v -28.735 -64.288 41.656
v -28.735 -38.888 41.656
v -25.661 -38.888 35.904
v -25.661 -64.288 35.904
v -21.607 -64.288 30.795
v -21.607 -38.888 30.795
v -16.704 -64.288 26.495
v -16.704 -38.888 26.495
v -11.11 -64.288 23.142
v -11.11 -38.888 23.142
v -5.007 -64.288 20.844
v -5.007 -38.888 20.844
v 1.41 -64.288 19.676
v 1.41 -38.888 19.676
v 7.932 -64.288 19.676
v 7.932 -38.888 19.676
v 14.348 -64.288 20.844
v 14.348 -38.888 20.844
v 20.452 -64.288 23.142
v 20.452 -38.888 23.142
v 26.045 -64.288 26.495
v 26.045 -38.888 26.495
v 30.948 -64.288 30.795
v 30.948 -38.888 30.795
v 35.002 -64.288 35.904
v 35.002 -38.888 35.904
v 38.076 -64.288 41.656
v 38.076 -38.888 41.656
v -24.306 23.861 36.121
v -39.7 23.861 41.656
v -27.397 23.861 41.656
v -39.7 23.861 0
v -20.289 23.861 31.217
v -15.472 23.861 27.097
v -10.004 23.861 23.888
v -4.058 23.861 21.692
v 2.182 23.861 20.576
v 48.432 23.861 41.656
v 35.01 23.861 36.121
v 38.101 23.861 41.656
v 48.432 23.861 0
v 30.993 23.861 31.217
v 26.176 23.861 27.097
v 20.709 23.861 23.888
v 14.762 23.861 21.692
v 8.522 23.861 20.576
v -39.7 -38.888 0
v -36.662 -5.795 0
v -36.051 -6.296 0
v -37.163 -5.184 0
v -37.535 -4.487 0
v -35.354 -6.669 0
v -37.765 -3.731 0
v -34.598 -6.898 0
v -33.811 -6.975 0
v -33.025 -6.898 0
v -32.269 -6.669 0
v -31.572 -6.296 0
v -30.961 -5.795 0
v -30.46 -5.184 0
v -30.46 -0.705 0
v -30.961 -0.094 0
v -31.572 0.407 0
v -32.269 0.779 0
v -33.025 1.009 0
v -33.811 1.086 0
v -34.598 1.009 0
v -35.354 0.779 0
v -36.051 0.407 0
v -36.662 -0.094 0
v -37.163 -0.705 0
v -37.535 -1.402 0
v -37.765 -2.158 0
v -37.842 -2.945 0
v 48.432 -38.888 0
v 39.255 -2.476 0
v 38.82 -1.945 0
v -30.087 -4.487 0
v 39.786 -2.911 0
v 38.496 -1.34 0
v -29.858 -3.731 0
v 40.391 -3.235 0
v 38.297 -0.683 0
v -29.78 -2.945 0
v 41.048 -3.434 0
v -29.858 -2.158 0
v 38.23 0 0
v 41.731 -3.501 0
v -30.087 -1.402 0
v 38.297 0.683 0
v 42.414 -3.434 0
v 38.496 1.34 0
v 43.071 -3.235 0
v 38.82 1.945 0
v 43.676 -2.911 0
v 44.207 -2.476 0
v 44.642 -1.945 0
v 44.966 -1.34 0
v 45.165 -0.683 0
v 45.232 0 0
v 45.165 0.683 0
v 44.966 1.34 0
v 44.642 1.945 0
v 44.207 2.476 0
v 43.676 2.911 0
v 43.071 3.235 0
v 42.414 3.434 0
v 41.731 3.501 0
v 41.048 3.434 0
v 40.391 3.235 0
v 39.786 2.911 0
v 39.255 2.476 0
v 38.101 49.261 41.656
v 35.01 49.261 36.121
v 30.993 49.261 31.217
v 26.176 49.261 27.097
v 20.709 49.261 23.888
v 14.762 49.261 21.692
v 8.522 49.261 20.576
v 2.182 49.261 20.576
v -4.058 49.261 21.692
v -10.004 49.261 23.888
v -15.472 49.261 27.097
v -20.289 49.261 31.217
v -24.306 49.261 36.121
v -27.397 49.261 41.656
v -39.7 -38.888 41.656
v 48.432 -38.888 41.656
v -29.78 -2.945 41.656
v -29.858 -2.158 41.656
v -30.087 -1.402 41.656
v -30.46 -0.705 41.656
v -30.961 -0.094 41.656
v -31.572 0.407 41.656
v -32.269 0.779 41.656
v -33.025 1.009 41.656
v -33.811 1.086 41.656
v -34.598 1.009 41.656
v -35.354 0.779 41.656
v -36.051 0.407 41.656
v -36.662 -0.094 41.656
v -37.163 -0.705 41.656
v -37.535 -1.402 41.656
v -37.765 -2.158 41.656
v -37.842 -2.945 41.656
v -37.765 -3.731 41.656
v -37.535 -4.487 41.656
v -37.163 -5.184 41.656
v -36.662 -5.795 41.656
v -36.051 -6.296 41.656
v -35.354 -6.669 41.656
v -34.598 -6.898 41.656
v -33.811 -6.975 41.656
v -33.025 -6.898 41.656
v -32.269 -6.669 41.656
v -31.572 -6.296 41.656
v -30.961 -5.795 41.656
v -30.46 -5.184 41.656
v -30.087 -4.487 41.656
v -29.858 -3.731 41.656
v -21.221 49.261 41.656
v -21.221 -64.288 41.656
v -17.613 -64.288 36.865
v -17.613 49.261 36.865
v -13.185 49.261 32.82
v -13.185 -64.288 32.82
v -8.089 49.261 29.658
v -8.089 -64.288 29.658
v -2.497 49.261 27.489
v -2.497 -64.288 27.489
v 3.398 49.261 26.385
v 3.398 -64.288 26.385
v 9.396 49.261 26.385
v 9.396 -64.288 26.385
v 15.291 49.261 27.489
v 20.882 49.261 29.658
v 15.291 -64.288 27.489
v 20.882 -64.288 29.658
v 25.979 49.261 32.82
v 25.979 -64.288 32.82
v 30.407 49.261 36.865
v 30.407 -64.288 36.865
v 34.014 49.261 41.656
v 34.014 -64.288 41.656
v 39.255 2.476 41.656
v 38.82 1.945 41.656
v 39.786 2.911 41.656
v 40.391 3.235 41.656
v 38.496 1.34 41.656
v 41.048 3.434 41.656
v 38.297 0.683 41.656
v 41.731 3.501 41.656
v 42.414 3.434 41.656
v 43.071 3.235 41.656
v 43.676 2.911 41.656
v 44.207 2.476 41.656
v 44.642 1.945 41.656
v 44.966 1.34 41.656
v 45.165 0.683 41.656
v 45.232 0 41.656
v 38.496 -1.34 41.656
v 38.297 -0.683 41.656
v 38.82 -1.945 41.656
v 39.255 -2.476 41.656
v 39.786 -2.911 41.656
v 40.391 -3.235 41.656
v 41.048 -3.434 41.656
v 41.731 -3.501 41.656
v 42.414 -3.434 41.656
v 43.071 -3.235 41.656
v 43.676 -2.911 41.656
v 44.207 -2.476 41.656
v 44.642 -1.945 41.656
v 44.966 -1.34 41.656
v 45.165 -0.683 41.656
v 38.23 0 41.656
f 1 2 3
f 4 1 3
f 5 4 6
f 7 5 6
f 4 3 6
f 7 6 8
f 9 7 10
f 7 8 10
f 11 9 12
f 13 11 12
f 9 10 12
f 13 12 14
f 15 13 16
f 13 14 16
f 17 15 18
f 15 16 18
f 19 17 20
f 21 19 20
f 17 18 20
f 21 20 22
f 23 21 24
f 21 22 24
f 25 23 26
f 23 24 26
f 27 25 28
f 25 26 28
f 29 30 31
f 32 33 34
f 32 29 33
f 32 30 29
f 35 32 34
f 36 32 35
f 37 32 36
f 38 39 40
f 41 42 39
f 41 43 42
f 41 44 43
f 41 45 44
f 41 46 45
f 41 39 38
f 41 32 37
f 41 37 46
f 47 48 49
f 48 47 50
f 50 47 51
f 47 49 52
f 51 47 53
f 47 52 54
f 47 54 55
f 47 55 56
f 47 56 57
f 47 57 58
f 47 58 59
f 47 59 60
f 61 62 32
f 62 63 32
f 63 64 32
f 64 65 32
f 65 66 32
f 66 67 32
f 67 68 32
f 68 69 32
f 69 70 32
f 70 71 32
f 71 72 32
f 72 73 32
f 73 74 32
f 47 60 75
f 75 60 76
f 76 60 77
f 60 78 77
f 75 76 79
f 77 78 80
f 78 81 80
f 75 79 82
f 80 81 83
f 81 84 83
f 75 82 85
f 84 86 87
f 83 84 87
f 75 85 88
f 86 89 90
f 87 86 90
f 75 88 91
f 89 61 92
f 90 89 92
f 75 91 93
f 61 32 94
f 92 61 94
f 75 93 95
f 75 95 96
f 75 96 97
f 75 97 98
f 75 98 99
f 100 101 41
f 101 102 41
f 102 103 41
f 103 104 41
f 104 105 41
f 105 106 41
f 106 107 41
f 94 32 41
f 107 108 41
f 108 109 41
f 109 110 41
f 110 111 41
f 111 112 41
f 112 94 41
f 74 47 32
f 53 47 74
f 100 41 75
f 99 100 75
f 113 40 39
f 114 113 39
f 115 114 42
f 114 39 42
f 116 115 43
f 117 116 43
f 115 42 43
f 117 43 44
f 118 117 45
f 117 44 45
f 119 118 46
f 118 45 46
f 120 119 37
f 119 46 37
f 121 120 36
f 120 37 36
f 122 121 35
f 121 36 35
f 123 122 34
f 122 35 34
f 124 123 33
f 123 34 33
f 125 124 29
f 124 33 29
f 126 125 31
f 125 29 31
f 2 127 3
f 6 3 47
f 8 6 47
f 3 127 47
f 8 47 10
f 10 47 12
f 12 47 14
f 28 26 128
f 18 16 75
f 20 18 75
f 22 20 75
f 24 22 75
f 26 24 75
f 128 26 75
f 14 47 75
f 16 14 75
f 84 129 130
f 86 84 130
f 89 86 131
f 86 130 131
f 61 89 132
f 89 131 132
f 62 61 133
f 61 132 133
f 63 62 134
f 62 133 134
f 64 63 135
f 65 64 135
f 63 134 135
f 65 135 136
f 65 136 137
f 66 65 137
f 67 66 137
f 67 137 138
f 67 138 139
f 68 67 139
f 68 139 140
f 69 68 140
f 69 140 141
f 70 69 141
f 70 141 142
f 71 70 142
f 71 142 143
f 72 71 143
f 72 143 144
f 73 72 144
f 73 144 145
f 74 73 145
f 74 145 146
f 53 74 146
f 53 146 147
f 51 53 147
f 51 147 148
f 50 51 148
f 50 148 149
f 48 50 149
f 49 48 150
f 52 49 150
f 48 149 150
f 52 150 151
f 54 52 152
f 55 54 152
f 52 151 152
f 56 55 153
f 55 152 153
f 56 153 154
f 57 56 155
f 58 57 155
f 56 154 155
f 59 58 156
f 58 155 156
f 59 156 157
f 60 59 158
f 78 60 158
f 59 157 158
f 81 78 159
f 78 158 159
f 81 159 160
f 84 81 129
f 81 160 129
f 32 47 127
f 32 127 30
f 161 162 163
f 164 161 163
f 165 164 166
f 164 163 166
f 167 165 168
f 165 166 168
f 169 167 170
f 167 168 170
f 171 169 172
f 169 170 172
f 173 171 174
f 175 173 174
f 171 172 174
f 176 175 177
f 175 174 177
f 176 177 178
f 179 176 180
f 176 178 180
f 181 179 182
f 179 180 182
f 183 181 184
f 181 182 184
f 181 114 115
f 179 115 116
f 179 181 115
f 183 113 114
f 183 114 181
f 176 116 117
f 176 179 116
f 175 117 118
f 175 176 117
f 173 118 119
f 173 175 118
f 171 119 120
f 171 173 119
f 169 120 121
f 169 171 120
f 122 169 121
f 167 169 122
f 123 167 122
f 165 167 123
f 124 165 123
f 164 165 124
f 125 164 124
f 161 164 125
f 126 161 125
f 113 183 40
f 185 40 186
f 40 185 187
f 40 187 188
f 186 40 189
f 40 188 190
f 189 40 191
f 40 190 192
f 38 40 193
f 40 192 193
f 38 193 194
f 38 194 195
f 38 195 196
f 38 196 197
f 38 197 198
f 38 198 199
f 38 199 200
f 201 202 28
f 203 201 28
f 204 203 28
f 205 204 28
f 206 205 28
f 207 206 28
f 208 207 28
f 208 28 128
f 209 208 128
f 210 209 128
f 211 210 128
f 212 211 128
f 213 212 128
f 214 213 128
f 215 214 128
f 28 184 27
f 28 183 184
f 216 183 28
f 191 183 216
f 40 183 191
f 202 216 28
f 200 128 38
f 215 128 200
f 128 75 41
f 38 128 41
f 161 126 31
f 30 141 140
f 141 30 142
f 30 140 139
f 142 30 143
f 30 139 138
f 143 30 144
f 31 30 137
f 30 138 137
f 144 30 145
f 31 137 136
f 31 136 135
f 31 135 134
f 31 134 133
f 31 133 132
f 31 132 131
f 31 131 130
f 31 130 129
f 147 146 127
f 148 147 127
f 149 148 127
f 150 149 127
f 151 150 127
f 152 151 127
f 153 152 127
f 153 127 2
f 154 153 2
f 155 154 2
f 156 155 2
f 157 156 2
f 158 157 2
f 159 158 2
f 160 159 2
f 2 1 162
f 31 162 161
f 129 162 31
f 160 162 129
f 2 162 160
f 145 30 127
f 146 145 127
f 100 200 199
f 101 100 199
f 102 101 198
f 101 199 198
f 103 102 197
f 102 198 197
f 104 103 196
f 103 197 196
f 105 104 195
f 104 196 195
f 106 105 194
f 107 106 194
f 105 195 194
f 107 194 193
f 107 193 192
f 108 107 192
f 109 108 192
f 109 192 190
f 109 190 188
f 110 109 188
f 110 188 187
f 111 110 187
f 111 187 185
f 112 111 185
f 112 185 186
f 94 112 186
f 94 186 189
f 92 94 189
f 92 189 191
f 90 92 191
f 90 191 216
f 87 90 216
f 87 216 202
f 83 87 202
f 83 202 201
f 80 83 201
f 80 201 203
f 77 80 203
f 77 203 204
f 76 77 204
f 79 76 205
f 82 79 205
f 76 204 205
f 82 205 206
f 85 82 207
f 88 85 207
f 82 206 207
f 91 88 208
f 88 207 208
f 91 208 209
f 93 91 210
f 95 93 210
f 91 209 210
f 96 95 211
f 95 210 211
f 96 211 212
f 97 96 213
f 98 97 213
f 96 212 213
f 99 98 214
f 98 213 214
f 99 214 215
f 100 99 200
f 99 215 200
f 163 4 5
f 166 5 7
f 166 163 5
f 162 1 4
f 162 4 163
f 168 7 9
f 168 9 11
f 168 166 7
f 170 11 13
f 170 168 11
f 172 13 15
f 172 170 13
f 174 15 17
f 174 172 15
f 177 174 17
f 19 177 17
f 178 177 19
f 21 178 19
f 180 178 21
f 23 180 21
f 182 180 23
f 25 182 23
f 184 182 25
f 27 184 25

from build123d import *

# Parameters (mm, degrees)
F0_W     = 88.1328396499
F0_H     = 62.7489611506
F1_DEPTH = 41.656
F3_DEPTH = 2514.6
F4_DEPTH = 25.4
F6_DEPTH = 25.4
F7_R     = 4.0308463813
F8_R     = 3.5011356281
F9_DEPTH = 2514.6


with BuildPart() as f1:
    # F0 (on Top) → F1 (new body)
    with BuildSketch(Plane.XY):
        with Locations((4.3660271913, -7.5136311352)):
            Rectangle(F0_W, F0_H)
    extrude(amount=F1_DEPTH)

    # F2 (on face) → F3 (cut)
    with BuildSketch(Plane.XZ.offset(38.8881117105)):
        with BuildLine():
            Line((34.01440382, 41.656), (-21.2209261954, 41.656))
            ThreePointArc((-21.2209261954, 41.656), (6.3967388123, 26.2462017045), (34.01440382, 41.656))
        make_face()
    extrude(amount=-F3_DEPTH, mode=Mode.SUBTRACT)

    # F2 (on face) → F4 (join)
    with BuildSketch(Plane.XZ.offset(38.8881117105)):
        with BuildLine():
            ThreePointArc((34.01440382, 41.656), (6.3967388123, 26.2462017045), (-21.2209261954, 41.656))
            Line((-21.2209261954, 41.656), (-28.734555468, 41.656))
            ThreePointArc((-28.734555468, 41.656), (4.6706357971, 19.5296360838), (38.0758270621, 41.656))
            Line((38.0758270621, 41.656), (34.01440382, 41.656))
        make_face()
    extrude(amount=F4_DEPTH)

    # F5 (on face) → F6 (join)
    with BuildSketch(Plane(origin=(0, 23.8608494401, 0), x_dir=(-1, 0, 0), z_dir=(0, 1, 0))):
        with BuildLine():
            Line((-34.01440382, 41.656), (-38.1010249257, 41.656))
            ThreePointArc((-38.1010249257, 41.656), (-5.3521022201, 20.4356830154), (27.3968204856, 41.656))
            Line((27.3968204856, 41.656), (21.2209261954, 41.656))
            ThreePointArc((21.2209261954, 41.656), (-6.3967388123, 26.2462017045), (-34.01440382, 41.656))
        make_face()
    extrude(amount=F6_DEPTH)

    # F7 (on face) + F8 (on face) → F9 (cut)
    with BuildSketch(Plane.XY.offset(41.656)):
        with Locations((-33.8113345206, -2.9445304535)):
            Circle(F7_R)
    with BuildSketch(Plane.XY.offset(41.656)):
        with Locations((41.7311042547, 0)):
            Circle(F8_R)
    extrude(amount=-F9_DEPTH, mode=Mode.SUBTRACT)


solid = f1.part
